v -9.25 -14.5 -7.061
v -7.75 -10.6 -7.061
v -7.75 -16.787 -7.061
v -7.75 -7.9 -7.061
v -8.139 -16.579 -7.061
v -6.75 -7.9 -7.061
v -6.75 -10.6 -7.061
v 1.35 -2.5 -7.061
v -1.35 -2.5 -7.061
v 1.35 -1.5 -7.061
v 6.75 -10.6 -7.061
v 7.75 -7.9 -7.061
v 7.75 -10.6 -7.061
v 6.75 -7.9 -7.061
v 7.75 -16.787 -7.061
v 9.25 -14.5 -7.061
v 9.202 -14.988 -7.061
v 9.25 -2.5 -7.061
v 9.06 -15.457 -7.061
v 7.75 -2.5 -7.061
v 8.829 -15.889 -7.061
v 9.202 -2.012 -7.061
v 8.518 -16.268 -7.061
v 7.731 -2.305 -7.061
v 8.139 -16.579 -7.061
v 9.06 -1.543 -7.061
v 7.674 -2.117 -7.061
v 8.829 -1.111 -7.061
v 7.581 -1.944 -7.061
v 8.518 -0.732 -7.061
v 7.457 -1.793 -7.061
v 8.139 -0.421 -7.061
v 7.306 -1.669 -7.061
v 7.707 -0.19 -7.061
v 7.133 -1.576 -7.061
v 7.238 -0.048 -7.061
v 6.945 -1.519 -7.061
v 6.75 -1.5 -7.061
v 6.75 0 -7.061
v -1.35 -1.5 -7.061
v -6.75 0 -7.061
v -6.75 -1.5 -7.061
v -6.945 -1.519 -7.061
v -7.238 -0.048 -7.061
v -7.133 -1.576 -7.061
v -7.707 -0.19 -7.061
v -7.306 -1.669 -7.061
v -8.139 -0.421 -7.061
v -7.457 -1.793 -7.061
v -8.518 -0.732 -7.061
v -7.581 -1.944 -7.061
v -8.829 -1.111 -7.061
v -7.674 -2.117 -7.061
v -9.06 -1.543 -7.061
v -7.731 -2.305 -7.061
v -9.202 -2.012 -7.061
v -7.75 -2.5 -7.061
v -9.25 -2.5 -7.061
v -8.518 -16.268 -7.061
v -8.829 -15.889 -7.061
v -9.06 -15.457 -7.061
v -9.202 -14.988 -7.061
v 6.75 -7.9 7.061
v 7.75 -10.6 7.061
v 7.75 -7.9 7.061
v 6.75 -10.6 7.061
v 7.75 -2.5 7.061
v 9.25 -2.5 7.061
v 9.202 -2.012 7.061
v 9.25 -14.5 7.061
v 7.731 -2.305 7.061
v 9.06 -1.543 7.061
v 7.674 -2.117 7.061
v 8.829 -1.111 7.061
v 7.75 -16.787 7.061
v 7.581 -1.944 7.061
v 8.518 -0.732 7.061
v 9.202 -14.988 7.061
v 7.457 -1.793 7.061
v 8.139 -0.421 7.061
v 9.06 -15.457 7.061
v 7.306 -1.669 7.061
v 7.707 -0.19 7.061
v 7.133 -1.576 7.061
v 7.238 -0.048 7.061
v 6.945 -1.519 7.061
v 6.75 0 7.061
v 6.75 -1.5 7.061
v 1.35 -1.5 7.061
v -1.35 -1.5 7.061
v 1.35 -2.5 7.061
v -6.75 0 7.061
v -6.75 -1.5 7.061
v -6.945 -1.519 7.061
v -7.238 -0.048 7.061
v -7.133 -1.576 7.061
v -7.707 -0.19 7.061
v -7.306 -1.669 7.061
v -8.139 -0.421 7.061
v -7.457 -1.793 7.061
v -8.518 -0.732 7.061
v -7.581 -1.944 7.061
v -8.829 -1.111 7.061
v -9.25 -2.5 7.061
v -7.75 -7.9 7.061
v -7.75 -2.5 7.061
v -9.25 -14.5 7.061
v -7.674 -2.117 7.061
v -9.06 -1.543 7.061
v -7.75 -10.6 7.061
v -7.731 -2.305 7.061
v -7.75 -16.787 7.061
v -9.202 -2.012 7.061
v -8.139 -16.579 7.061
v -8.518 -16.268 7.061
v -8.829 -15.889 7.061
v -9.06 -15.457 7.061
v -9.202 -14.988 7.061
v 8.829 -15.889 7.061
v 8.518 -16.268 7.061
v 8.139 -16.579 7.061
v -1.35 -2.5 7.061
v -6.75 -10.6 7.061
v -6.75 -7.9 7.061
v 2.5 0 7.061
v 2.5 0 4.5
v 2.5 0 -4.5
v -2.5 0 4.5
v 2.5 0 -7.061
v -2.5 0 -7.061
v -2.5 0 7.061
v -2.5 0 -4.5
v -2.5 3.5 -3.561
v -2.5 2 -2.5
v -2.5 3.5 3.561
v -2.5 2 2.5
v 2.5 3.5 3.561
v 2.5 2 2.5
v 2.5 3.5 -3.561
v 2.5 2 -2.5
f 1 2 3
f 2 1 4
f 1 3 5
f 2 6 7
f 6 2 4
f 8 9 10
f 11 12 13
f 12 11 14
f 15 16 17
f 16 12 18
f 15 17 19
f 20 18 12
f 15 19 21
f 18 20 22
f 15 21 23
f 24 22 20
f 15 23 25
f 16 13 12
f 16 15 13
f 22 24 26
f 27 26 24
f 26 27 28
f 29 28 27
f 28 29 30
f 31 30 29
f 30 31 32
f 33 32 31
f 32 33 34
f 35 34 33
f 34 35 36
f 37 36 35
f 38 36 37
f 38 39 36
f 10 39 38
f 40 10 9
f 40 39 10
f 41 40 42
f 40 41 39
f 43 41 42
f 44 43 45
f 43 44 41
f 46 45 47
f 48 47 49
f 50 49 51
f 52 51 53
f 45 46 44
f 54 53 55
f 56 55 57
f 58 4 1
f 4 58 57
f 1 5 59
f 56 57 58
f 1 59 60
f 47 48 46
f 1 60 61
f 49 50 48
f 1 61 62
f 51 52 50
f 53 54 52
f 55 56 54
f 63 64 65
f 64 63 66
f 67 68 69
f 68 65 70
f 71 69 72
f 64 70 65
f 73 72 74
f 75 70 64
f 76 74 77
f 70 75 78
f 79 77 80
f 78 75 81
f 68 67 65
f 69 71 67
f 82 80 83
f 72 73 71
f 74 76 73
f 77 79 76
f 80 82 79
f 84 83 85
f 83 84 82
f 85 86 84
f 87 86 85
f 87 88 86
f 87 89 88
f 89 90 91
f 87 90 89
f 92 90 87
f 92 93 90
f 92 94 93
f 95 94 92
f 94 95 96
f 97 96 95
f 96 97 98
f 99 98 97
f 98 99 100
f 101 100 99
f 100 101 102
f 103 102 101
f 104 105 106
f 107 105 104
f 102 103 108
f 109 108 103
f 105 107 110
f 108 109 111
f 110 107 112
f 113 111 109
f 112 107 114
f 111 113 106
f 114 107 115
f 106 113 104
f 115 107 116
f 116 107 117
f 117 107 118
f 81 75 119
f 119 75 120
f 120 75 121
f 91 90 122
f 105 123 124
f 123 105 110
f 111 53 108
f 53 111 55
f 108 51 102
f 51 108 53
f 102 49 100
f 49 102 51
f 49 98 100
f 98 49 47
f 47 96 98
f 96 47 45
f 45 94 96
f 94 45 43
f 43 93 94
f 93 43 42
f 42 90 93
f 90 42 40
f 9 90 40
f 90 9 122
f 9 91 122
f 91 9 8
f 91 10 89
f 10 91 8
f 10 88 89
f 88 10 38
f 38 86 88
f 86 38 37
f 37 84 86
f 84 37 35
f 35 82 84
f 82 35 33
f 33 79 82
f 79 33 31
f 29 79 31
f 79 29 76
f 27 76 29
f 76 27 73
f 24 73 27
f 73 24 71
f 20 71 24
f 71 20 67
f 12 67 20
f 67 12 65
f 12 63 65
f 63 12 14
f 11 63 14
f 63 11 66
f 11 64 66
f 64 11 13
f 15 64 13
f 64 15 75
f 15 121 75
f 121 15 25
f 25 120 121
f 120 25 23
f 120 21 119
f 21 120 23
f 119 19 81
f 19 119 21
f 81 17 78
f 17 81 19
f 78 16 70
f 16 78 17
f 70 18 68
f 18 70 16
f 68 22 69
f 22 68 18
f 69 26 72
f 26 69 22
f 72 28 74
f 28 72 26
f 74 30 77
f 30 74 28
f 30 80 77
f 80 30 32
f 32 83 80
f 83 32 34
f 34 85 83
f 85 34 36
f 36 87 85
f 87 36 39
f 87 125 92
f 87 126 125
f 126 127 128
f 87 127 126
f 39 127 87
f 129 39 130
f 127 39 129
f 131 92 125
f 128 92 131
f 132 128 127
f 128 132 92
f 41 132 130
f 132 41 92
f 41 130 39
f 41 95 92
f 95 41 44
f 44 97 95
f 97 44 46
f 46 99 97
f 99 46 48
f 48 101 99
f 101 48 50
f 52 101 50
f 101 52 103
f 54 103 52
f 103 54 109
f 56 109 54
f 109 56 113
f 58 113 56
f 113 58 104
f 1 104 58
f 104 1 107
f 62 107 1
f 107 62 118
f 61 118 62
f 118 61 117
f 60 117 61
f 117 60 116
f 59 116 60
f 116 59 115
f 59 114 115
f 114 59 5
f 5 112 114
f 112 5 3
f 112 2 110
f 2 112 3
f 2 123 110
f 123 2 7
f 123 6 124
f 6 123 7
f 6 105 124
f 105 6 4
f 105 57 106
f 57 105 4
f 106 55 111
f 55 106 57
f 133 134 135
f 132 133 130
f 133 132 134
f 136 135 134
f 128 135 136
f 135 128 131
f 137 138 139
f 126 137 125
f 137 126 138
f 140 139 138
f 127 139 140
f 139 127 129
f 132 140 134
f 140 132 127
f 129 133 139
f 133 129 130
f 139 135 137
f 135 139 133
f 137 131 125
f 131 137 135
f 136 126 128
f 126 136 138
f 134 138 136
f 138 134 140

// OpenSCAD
// file: isosceles_trapezoid.scad
module isosceles_trapezoid(d = 5, angle = 45, h = 1, height = 1) {
	bevel_width = h/tan(angle);
	base_width = d + 2*bevel_width;
	scale_x = base_width/d;

	// turn back into 2D primitive
	projection()
		// turn flat on x plane
		rotate([90, 0, 0])
			// move back into center
			translate([0, 0, -h/2])
				// extrude with scaling into trapezoid
				linear_extrude(height = h, scale=[scale_x, 1])
					square([d, 1], center = true);
}

isosceles_trapezoid();
// file: tie_clip_holder.scad
use <isosceles_trapezoid.scad>;

// derive bevel width from thickness so that actual bevel thickness equals
// thickness
function tie_clip_holder_outer_length(clip_width, angle, thickness) =
	let(bevel_width = sin(angle)*thickness)
	clip_width + 2*bevel_width;

function tie_clip_holder_outer_height(clip_height, thickness) =
	clip_height + thickness;

// allow users to query the base width of the holder so they know what room
// they must make for attaching it somewhere
function tie_clip_holder_base_length(clip_width, clip_height, angle, thickness) =
	let(bevel_width = tie_clip_holder_outer_height(clip_height, thickness)/tan(angle))
	tie_clip_holder_outer_length(clip_width, angle, thickness) + 2*bevel_width;

module tie_clip_holder(holder_width = 5,
		clip_width = 5, clip_height = 2, thickness = 1.5, angle = 45) {
	outer_height = tie_clip_holder_outer_height(clip_height, thickness);

	// move to a zero line in y direction and otherwise in center
	// so we can put it on top of other stuff
	translate([0, outer_height/2, -holder_width/2])
		linear_extrude(holder_width)
			difference() {
				outer_length = tie_clip_holder_outer_length(clip_width,
					angle, thickness);

				// beveled for more technical look and better
				// overhang printing
				isosceles_trapezoid(d = outer_length, h = outer_height,
					angle = angle);
				translate([0, -thickness/2, 0])
					isosceles_trapezoid(d = clip_width,
						h = clip_height, angle = angle);

			}
}

tie_clip_holder();
// file: openbeam_clip.scad
$fn = 32;

module rounded_rectangle(width = 1, height = 1, rounding = 0) {
	if (rounding > 0) {
		non_rounded_width = width - 2*rounding;
		non_rounded_height = height - 2*rounding;

		// correct for funky minkowski displacement
		translate([-non_rounded_width/2, -non_rounded_height/2])
			minkowski() {
				square([non_rounded_width, non_rounded_height], center = true);
				translate([non_rounded_width/2, non_rounded_height/2, 0])
					circle(rounding, center = true);
			}
	} else {
		// minkowski doesn't work properly on circle with diameter 0
		square([width, height], center = true);
	}
}

function openbeam_clip_outer_width(beam_width, thickness) =
	beam_width + 2*thickness;

module openbeam_clip_cross(beam_width, rounding, thickness) {
	difference() {
		outer_width = openbeam_clip_outer_width(beam_width = beam_width,
			thickness = thickness);

		// since clip is open at the bottom, remove one thickness and
		// move down by half of that to be back in center
		translate([0, thickness/2, 0])
			rounded_rectangle(width = outer_width,
				height = outer_width - thickness,
				rounding = rounding + thickness);

		// make inner rectangle higher than outer by one thickness
		// (to be on the safe side) and shift down by
		// half of that to be centered with the outer again
		translate([0, -thickness/2, 0])
			rounded_rectangle(width = beam_width,
				height = beam_width + thickness,
				rounding = rounding);
	}
}

module openbeam_clip_stay(slot_width = 3.2, protrusion = 0.75) {
	square([slot_width, protrusion], center = true);
}

module openbeam_clip(beam_width = 15, height = 15,
		beam_slot_width = 3.2, stay_protrusion = 1,
		rounding = 1, thickness = 1.5,
		epsilon = 0.25) {
	cbw = beam_width + 2*epsilon;
	outer_width = openbeam_clip_outer_width(beam_width = cbw, thickness = thickness);

	// move back into center after extrude but put top onto y as base-line
	// for attaching things to it
	translate([0, -outer_width/2, -height/2])
		linear_extrude(height)
			union() {
				openbeam_clip_cross(beam_width = cbw,
					rounding = rounding,
					thickness = thickness);

				// add in the stays
				stay_position = cbw/2 - stay_protrusion/2;
				cbsw = beam_slot_width - 2*epsilon;
				for (stay_angle =[-90:90:90])
					rotate([0, 0, stay_angle])
						translate([0, stay_position, 0])
						openbeam_clip_stay(slot_width = cbsw,
							protrusion = stay_protrusion);
			}
}

openbeam_clip();
// main file
$fn = 32;
use <openbeam_clip.scad>;
use <tie_clip_holder.scad>;

module openbeam_tie_clip_clip(beam_width = 15, height = 5,
		tie_clip_width = 5, tie_clip_height = 2,
		tie_clip_holder_angle = 45,
		thickness = 1.5, epsilon = 0.25) {
	union() {
		openbeam_clip(beam_width = beam_width,
			height = tie_clip_holder_base_length(
				clip_width = tie_clip_width,
				clip_height = tie_clip_height,
				angle = tie_clip_holder_angle,
				thickness = thickness),
			thickness = thickness,
			epsilon = 0.25);

		rotate([0, 90, 0])
			tie_clip_holder(clip_width = tie_clip_width,
				clip_height = tie_clip_height,
				holder_width = height,
				thickness = thickness,
				angle = tie_clip_holder_angle);
	}
}

openbeam_tie_clip_clip();
